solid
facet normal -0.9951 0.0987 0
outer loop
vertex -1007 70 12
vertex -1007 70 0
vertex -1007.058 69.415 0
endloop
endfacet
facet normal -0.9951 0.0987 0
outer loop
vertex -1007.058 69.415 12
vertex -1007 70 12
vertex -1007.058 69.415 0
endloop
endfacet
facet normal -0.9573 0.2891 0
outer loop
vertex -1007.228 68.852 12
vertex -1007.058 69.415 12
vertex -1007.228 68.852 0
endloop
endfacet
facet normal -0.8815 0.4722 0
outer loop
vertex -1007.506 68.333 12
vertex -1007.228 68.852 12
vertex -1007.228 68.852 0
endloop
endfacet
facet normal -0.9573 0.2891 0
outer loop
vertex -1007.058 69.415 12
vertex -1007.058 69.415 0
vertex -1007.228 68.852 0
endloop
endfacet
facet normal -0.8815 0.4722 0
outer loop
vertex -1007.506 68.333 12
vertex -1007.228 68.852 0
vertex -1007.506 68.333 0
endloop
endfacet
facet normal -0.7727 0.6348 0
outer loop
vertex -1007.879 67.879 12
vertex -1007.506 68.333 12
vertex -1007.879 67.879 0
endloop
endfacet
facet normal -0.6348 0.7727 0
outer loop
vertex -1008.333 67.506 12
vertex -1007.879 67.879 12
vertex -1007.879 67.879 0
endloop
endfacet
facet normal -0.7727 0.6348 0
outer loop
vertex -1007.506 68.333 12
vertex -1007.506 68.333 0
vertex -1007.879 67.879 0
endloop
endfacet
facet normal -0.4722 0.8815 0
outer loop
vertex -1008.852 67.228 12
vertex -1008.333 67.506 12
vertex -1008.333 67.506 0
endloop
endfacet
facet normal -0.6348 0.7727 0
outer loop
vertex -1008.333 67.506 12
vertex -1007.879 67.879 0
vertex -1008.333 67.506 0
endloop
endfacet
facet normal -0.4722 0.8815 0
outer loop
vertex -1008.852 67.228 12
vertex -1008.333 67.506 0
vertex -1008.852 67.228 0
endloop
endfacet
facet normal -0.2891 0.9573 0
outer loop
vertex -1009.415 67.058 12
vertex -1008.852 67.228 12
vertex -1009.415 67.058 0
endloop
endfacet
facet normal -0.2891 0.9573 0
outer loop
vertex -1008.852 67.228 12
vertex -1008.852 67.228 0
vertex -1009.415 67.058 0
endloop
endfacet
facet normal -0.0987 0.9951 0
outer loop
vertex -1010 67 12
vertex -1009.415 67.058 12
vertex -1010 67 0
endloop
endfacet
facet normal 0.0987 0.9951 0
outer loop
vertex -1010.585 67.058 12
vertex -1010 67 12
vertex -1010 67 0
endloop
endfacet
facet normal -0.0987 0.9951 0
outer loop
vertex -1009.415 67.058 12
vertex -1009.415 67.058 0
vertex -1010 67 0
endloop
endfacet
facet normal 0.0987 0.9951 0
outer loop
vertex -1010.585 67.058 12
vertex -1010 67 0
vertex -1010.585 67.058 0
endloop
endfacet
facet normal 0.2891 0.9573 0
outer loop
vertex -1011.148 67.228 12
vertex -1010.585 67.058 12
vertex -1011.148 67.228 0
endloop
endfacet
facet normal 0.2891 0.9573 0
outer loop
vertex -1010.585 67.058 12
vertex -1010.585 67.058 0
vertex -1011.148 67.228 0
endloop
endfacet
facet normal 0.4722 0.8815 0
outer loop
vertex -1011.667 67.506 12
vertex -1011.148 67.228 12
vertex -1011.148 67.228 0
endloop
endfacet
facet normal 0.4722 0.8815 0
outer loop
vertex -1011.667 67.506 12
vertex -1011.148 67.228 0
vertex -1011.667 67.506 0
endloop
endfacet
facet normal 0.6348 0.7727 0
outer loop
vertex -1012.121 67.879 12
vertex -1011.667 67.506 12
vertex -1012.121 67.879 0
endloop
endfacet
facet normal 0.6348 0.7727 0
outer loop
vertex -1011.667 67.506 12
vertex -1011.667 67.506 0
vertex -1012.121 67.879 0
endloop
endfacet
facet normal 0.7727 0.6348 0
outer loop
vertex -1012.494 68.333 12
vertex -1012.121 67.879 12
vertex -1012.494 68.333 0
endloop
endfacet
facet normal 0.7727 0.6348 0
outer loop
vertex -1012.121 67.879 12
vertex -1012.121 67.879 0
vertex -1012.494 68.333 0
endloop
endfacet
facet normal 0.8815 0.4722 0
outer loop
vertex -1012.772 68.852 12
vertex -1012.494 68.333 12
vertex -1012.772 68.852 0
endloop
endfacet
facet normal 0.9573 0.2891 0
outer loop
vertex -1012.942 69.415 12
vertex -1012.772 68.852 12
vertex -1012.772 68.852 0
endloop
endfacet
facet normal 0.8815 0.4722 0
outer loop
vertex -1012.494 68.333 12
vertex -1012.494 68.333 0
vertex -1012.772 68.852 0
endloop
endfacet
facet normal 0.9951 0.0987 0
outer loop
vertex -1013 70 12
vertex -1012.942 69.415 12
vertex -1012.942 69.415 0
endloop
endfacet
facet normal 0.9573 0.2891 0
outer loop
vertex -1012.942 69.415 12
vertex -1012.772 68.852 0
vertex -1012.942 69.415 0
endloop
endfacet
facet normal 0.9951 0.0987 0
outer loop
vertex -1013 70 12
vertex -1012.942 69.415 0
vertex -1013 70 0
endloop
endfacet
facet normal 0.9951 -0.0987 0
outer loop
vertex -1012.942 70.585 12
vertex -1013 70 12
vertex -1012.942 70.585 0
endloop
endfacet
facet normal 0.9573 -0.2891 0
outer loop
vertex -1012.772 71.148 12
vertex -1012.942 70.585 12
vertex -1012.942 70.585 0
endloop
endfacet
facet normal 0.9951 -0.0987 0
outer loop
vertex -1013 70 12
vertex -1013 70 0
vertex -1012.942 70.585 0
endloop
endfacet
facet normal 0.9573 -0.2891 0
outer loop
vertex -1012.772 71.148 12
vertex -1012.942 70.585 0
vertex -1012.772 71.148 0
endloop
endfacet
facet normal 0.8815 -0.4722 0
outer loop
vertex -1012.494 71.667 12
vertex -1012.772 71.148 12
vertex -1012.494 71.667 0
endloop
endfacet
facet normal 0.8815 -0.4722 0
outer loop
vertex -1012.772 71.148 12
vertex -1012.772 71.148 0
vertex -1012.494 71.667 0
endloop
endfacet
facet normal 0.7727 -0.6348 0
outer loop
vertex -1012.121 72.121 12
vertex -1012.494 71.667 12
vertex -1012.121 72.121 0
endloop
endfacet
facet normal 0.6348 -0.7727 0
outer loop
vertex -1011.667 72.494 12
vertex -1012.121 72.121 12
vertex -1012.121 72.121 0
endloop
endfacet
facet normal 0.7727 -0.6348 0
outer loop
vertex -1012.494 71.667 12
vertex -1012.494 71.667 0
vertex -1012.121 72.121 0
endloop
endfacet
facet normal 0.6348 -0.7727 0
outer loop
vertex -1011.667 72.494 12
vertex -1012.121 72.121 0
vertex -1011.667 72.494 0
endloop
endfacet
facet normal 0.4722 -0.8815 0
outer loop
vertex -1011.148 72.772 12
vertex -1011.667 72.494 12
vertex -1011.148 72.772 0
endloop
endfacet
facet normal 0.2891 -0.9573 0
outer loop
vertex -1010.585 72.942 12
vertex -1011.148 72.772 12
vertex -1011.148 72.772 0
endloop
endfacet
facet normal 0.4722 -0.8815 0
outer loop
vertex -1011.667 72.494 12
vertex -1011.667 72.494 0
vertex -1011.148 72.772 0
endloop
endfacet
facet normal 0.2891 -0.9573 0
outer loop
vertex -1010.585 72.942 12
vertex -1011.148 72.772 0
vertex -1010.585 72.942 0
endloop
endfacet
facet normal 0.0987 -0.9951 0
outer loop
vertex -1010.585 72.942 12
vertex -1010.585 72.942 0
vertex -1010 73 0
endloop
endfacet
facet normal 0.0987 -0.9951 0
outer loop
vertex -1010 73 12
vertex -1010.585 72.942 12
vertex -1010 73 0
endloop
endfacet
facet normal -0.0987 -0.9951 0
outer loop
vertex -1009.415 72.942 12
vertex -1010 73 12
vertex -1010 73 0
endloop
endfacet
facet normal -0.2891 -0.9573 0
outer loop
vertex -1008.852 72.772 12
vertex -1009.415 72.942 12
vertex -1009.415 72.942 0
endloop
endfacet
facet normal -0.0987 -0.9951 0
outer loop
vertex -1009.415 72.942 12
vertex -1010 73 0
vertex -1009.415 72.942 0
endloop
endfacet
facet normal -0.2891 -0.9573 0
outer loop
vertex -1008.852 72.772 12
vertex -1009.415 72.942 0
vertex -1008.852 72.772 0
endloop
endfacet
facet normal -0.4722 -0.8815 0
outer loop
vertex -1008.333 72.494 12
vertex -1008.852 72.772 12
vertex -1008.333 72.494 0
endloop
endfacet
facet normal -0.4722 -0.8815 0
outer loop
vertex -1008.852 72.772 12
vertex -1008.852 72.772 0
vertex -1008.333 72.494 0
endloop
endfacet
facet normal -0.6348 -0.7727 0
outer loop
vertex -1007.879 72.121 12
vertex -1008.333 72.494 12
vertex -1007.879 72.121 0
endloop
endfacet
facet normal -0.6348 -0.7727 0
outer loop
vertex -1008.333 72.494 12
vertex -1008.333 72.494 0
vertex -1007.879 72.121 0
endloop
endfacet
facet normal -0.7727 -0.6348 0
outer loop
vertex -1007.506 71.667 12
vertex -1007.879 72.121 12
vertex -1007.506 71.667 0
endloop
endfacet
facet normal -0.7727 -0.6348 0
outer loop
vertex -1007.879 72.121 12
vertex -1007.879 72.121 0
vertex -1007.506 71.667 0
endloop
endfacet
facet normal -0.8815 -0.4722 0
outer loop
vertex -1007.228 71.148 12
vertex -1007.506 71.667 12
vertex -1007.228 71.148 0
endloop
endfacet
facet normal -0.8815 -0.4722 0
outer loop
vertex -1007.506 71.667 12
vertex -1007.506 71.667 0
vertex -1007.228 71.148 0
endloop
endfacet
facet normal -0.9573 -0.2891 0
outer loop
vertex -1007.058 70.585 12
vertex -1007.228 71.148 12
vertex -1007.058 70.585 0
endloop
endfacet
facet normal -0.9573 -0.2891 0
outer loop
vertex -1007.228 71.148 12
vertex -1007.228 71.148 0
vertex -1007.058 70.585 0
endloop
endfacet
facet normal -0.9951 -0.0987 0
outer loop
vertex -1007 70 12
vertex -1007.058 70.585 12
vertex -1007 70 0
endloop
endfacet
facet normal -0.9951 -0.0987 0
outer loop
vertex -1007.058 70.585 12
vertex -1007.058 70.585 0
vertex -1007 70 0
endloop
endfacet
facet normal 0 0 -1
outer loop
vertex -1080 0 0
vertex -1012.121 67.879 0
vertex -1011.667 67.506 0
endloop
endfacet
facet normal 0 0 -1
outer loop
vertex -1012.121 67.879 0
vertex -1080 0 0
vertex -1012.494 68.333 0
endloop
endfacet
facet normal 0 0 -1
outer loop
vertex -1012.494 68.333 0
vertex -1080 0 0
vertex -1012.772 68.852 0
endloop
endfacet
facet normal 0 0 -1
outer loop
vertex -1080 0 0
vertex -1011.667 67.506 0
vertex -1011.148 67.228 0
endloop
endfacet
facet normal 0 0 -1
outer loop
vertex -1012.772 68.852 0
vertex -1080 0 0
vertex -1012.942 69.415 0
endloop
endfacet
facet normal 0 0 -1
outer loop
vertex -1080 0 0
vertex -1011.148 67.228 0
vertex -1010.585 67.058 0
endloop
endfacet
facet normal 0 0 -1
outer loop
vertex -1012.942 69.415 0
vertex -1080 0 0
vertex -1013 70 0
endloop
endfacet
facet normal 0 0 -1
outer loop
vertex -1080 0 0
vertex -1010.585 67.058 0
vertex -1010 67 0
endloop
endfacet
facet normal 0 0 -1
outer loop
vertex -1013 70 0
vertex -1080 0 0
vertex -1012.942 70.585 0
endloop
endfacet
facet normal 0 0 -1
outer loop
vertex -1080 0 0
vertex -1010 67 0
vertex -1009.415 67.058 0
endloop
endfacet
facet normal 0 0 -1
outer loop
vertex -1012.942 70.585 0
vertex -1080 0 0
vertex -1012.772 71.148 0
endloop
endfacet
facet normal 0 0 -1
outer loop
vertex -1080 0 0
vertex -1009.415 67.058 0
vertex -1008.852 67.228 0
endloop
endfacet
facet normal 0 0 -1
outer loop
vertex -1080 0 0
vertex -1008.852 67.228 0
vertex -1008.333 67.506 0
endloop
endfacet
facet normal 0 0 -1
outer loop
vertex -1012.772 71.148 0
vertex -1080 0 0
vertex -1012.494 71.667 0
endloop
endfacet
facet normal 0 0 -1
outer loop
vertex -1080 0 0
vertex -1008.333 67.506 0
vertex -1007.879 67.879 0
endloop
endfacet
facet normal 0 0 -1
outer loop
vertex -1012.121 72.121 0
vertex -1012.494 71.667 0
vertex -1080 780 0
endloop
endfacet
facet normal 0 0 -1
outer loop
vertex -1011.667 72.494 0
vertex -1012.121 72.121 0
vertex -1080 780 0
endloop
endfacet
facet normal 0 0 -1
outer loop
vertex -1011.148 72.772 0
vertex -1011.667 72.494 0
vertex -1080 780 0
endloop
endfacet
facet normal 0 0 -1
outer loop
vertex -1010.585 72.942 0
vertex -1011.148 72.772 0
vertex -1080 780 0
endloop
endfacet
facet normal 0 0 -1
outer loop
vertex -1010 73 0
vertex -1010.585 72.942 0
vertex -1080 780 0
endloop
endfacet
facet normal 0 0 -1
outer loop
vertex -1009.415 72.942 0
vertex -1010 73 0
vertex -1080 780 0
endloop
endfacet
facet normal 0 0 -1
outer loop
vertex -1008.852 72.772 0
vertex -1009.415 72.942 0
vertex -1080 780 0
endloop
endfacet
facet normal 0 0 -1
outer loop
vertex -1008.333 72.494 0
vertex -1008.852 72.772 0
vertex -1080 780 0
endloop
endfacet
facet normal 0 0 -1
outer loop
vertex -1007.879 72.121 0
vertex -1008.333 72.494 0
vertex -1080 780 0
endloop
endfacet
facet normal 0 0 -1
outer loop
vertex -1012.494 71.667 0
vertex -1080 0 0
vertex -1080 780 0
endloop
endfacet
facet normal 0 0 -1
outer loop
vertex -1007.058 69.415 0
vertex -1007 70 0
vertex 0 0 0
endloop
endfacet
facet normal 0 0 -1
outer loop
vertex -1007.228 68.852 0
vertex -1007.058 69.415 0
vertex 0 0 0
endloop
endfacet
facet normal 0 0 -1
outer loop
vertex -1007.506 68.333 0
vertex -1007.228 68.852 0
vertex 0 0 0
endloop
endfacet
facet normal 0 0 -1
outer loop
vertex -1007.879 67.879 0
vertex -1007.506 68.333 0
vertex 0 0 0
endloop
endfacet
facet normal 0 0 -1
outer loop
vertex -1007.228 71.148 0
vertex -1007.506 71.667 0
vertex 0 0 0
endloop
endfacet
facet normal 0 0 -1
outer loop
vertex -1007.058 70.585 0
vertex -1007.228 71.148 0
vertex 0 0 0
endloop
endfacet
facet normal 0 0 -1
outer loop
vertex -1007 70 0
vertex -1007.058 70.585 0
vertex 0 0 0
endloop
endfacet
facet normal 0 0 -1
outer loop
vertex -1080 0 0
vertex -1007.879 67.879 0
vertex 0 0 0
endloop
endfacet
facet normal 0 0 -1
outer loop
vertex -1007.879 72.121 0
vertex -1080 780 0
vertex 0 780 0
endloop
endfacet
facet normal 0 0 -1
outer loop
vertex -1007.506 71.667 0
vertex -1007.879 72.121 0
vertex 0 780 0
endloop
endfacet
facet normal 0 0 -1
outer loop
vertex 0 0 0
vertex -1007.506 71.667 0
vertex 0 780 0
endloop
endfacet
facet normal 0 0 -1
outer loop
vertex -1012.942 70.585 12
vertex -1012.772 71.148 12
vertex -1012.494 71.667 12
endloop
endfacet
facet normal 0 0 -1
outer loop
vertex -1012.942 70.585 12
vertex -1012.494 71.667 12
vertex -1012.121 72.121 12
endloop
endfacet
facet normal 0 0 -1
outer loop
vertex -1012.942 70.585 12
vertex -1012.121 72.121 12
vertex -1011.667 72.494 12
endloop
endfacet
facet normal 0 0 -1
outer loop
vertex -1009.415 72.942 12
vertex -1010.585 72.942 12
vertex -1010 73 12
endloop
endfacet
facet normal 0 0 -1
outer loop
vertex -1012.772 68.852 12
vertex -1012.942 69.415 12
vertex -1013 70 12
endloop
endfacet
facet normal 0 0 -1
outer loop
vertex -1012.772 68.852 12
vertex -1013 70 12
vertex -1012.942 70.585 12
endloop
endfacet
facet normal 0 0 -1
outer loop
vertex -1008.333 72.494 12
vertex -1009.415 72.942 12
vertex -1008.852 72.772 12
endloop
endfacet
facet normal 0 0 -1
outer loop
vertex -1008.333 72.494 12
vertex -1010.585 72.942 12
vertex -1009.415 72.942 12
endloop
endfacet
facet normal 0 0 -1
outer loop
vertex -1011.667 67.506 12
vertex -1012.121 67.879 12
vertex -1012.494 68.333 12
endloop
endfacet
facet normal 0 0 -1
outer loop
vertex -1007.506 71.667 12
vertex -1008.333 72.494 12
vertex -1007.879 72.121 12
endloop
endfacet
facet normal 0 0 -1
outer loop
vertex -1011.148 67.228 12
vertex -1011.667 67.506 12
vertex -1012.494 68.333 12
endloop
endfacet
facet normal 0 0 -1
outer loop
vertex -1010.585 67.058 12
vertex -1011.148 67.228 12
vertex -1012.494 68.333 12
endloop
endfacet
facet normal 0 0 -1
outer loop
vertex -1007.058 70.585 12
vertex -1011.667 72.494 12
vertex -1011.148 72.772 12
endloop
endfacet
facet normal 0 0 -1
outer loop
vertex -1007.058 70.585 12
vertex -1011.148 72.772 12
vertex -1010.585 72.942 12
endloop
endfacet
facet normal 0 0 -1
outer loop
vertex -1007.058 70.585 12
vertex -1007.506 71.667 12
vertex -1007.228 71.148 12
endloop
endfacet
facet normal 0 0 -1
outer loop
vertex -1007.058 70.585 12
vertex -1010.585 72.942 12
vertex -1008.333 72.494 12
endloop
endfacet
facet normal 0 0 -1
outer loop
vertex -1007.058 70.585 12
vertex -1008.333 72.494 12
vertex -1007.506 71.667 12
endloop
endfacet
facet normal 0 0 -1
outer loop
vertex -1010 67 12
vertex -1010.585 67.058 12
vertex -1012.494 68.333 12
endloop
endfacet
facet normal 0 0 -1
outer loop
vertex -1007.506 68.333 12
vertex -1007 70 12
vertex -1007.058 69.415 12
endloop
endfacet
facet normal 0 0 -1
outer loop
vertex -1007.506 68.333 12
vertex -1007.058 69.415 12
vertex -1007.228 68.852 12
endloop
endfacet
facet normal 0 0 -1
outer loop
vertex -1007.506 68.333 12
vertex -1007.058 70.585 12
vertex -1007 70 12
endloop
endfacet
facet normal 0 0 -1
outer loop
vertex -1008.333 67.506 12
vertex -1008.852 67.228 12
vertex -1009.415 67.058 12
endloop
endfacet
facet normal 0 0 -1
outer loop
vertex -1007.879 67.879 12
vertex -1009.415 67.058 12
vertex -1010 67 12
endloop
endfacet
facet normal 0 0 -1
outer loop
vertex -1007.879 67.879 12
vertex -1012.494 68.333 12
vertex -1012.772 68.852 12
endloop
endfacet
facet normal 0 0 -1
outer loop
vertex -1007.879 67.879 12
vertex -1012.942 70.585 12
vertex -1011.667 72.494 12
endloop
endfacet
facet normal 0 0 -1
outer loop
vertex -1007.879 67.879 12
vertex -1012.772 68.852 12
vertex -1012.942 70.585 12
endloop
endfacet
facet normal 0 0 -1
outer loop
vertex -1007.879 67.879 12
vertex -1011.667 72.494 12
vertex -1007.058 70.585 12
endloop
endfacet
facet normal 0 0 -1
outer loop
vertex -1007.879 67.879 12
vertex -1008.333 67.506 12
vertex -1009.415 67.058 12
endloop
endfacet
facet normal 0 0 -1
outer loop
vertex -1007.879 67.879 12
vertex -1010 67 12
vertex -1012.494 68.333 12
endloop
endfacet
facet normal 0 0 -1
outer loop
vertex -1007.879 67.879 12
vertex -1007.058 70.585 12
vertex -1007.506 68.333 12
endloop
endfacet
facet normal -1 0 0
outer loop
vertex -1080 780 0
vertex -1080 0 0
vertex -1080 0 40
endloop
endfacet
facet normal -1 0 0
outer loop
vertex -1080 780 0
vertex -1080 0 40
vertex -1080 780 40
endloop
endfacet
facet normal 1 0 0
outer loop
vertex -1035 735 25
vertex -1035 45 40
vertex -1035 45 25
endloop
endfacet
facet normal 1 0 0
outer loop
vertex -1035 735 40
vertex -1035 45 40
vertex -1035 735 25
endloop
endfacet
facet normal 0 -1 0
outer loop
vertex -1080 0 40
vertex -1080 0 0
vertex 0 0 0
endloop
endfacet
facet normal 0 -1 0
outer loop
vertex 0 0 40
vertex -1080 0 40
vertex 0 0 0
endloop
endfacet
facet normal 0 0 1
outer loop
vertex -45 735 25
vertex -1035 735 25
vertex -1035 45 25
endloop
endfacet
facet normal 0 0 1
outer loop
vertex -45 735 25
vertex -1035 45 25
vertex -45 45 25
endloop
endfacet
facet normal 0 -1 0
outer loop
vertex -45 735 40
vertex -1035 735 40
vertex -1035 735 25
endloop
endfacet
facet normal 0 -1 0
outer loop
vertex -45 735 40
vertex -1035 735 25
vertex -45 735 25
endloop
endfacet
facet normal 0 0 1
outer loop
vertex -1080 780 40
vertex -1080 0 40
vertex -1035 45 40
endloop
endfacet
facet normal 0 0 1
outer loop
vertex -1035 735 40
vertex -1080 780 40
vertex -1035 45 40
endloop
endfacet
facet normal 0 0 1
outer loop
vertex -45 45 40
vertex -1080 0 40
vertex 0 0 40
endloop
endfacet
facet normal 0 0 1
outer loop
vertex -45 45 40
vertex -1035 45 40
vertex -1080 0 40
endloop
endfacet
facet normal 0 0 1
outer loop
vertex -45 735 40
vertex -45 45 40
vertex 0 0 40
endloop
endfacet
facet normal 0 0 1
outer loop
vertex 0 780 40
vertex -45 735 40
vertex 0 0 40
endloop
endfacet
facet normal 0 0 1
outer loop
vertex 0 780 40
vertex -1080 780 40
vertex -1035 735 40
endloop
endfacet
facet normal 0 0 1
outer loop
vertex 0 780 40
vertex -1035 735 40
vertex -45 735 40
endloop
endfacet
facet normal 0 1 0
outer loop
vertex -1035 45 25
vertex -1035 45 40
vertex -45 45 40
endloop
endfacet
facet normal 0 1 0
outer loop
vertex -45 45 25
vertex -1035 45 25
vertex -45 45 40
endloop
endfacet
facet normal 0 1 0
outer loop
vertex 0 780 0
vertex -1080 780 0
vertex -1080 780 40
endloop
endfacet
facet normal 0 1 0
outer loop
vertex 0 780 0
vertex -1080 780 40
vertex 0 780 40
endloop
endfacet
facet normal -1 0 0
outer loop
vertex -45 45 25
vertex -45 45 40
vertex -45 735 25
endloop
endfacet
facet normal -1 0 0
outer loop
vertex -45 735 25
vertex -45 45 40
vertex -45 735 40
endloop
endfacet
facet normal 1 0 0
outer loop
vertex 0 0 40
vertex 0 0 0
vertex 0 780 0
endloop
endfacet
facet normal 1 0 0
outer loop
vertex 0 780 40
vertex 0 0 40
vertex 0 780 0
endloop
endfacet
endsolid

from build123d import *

# Parameters (mm, degrees)
F0_W     = 1080
F0_H     = 780
F1_DEPTH = 40
F2_R     = 3
F3_DEPTH = 12
F4_W     = 990
F4_H     = 690
F5_DEPTH = 15


with BuildPart() as f1:
    # F0 (on Top) → F1 (new body)
    with BuildSketch(Plane.XY):
        with Locations((-540, 390)):
            Rectangle(F0_W, F0_H)
    extrude(amount=F1_DEPTH)

    # F2 (on face) → F3 (cut)
    with BuildSketch(Plane(origin=(0, 0, 0), x_dir=(1, 0, 0), z_dir=(0, 0, -1))):
        with Locations((-1010, -70)):
            Circle(F2_R)
    extrude(amount=-F3_DEPTH, mode=Mode.SUBTRACT)

    # F4 (on face) → F5 (cut)
    with BuildSketch(Plane.XY.offset(40)):
        with Locations((-540, 390)):
            Rectangle(F4_W, F4_H)
    extrude(amount=-F5_DEPTH, mode=Mode.SUBTRACT)


solid = f1.part
